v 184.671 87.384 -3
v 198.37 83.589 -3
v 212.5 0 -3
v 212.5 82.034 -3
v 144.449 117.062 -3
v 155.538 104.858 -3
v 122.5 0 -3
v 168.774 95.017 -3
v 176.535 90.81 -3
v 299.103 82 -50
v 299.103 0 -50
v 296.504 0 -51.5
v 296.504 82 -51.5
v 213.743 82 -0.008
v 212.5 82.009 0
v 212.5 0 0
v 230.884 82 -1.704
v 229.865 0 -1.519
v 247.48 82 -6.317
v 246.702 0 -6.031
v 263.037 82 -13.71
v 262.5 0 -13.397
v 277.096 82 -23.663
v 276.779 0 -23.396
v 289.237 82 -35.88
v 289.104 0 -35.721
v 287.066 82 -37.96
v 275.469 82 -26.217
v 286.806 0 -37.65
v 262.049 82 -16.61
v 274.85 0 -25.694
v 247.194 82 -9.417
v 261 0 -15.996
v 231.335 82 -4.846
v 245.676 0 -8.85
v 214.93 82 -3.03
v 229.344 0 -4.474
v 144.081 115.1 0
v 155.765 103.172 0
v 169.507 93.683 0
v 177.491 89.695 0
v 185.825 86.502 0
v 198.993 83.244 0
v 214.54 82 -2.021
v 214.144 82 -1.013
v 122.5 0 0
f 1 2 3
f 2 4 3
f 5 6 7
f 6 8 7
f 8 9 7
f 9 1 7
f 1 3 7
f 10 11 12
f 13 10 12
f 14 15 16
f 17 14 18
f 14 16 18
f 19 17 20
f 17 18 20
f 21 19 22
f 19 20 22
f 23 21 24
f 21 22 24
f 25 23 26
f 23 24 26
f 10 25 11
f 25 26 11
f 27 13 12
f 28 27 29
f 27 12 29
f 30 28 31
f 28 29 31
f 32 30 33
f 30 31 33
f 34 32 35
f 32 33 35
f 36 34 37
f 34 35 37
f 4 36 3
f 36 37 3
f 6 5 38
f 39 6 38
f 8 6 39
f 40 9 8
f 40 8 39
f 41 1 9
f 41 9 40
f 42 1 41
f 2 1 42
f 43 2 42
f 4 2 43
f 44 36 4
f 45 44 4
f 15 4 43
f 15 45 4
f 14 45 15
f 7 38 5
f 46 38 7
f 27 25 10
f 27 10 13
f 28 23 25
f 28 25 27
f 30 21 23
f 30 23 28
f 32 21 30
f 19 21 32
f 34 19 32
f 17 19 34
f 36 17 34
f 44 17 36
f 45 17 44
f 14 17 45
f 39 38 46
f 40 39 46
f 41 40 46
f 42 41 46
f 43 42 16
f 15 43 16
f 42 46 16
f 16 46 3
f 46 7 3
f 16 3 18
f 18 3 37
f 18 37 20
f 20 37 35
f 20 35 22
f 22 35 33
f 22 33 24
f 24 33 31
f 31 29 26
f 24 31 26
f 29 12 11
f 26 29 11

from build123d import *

# Parameters (mm, degrees)
BASE_FLANGE1_DEPTH = 120
CUT_EXTRUDE1_DEPTH = 10


# Sheet-metal steps are written as plain solids
with BuildPart() as part:
    # Sketch1 → Base-Flange1 (new body)
    with BuildSketch(Plane(origin=(0, 0, 0), x_dir=(1, 0, 0), z_dir=(0, 1, 0))):
        with BuildLine():
            Line((122.5, 0), (212.5, 0))
            ThreePointArc((212.5, 0), (262.5, 13.397459622), (299.102540378, 50))
            Line((299.102540378, 50), (296.504464167, 51.5))
            ThreePointArc((296.504464167, 51.5), (261, 15.995535833), (212.5, 3))
            Line((212.5, 3), (122.5, 3))
            Line((122.5, 3), (122.5, 0))
        make_face()
    extrude(amount=BASE_FLANGE1_DEPTH)

    # Sketch6 → Cut-Extrude1 (cut)
    with BuildSketch(Plane.XY):
        Polygon((122.5, 120), (145, 120), (122.5, 0), align=None)
    extrude(amount=-CUT_EXTRUDE1_DEPTH, mode=Mode.SUBTRACT)

    # Sketch12 → Cut-Revolve1 (revolve, cut)
    with BuildSketch(Plane(origin=(25.631243638, 0, -75.648490011), x_dir=(0.8356082783221033, 0, 0.5493257732890113), z_dir=(0.5493257732890113, 0, -0.8356082783221033))):
        with BuildLine():
            Line((202.75, -82), (370.763557892, -82))
            Line((370.763557892, -82), (370.763557892, -132))
            Line((370.763557892, -132), (132.039321881, -132))
            ThreePointArc((132.039321881, -132), (159.448729811, -95.76275643), (202.75, -82))
        make_face()
    revolve(axis=Axis((25.631243638, 0, -75.648490011), (0, -1, 0)), mode=Mode.SUBTRACT)


solid = part.part
